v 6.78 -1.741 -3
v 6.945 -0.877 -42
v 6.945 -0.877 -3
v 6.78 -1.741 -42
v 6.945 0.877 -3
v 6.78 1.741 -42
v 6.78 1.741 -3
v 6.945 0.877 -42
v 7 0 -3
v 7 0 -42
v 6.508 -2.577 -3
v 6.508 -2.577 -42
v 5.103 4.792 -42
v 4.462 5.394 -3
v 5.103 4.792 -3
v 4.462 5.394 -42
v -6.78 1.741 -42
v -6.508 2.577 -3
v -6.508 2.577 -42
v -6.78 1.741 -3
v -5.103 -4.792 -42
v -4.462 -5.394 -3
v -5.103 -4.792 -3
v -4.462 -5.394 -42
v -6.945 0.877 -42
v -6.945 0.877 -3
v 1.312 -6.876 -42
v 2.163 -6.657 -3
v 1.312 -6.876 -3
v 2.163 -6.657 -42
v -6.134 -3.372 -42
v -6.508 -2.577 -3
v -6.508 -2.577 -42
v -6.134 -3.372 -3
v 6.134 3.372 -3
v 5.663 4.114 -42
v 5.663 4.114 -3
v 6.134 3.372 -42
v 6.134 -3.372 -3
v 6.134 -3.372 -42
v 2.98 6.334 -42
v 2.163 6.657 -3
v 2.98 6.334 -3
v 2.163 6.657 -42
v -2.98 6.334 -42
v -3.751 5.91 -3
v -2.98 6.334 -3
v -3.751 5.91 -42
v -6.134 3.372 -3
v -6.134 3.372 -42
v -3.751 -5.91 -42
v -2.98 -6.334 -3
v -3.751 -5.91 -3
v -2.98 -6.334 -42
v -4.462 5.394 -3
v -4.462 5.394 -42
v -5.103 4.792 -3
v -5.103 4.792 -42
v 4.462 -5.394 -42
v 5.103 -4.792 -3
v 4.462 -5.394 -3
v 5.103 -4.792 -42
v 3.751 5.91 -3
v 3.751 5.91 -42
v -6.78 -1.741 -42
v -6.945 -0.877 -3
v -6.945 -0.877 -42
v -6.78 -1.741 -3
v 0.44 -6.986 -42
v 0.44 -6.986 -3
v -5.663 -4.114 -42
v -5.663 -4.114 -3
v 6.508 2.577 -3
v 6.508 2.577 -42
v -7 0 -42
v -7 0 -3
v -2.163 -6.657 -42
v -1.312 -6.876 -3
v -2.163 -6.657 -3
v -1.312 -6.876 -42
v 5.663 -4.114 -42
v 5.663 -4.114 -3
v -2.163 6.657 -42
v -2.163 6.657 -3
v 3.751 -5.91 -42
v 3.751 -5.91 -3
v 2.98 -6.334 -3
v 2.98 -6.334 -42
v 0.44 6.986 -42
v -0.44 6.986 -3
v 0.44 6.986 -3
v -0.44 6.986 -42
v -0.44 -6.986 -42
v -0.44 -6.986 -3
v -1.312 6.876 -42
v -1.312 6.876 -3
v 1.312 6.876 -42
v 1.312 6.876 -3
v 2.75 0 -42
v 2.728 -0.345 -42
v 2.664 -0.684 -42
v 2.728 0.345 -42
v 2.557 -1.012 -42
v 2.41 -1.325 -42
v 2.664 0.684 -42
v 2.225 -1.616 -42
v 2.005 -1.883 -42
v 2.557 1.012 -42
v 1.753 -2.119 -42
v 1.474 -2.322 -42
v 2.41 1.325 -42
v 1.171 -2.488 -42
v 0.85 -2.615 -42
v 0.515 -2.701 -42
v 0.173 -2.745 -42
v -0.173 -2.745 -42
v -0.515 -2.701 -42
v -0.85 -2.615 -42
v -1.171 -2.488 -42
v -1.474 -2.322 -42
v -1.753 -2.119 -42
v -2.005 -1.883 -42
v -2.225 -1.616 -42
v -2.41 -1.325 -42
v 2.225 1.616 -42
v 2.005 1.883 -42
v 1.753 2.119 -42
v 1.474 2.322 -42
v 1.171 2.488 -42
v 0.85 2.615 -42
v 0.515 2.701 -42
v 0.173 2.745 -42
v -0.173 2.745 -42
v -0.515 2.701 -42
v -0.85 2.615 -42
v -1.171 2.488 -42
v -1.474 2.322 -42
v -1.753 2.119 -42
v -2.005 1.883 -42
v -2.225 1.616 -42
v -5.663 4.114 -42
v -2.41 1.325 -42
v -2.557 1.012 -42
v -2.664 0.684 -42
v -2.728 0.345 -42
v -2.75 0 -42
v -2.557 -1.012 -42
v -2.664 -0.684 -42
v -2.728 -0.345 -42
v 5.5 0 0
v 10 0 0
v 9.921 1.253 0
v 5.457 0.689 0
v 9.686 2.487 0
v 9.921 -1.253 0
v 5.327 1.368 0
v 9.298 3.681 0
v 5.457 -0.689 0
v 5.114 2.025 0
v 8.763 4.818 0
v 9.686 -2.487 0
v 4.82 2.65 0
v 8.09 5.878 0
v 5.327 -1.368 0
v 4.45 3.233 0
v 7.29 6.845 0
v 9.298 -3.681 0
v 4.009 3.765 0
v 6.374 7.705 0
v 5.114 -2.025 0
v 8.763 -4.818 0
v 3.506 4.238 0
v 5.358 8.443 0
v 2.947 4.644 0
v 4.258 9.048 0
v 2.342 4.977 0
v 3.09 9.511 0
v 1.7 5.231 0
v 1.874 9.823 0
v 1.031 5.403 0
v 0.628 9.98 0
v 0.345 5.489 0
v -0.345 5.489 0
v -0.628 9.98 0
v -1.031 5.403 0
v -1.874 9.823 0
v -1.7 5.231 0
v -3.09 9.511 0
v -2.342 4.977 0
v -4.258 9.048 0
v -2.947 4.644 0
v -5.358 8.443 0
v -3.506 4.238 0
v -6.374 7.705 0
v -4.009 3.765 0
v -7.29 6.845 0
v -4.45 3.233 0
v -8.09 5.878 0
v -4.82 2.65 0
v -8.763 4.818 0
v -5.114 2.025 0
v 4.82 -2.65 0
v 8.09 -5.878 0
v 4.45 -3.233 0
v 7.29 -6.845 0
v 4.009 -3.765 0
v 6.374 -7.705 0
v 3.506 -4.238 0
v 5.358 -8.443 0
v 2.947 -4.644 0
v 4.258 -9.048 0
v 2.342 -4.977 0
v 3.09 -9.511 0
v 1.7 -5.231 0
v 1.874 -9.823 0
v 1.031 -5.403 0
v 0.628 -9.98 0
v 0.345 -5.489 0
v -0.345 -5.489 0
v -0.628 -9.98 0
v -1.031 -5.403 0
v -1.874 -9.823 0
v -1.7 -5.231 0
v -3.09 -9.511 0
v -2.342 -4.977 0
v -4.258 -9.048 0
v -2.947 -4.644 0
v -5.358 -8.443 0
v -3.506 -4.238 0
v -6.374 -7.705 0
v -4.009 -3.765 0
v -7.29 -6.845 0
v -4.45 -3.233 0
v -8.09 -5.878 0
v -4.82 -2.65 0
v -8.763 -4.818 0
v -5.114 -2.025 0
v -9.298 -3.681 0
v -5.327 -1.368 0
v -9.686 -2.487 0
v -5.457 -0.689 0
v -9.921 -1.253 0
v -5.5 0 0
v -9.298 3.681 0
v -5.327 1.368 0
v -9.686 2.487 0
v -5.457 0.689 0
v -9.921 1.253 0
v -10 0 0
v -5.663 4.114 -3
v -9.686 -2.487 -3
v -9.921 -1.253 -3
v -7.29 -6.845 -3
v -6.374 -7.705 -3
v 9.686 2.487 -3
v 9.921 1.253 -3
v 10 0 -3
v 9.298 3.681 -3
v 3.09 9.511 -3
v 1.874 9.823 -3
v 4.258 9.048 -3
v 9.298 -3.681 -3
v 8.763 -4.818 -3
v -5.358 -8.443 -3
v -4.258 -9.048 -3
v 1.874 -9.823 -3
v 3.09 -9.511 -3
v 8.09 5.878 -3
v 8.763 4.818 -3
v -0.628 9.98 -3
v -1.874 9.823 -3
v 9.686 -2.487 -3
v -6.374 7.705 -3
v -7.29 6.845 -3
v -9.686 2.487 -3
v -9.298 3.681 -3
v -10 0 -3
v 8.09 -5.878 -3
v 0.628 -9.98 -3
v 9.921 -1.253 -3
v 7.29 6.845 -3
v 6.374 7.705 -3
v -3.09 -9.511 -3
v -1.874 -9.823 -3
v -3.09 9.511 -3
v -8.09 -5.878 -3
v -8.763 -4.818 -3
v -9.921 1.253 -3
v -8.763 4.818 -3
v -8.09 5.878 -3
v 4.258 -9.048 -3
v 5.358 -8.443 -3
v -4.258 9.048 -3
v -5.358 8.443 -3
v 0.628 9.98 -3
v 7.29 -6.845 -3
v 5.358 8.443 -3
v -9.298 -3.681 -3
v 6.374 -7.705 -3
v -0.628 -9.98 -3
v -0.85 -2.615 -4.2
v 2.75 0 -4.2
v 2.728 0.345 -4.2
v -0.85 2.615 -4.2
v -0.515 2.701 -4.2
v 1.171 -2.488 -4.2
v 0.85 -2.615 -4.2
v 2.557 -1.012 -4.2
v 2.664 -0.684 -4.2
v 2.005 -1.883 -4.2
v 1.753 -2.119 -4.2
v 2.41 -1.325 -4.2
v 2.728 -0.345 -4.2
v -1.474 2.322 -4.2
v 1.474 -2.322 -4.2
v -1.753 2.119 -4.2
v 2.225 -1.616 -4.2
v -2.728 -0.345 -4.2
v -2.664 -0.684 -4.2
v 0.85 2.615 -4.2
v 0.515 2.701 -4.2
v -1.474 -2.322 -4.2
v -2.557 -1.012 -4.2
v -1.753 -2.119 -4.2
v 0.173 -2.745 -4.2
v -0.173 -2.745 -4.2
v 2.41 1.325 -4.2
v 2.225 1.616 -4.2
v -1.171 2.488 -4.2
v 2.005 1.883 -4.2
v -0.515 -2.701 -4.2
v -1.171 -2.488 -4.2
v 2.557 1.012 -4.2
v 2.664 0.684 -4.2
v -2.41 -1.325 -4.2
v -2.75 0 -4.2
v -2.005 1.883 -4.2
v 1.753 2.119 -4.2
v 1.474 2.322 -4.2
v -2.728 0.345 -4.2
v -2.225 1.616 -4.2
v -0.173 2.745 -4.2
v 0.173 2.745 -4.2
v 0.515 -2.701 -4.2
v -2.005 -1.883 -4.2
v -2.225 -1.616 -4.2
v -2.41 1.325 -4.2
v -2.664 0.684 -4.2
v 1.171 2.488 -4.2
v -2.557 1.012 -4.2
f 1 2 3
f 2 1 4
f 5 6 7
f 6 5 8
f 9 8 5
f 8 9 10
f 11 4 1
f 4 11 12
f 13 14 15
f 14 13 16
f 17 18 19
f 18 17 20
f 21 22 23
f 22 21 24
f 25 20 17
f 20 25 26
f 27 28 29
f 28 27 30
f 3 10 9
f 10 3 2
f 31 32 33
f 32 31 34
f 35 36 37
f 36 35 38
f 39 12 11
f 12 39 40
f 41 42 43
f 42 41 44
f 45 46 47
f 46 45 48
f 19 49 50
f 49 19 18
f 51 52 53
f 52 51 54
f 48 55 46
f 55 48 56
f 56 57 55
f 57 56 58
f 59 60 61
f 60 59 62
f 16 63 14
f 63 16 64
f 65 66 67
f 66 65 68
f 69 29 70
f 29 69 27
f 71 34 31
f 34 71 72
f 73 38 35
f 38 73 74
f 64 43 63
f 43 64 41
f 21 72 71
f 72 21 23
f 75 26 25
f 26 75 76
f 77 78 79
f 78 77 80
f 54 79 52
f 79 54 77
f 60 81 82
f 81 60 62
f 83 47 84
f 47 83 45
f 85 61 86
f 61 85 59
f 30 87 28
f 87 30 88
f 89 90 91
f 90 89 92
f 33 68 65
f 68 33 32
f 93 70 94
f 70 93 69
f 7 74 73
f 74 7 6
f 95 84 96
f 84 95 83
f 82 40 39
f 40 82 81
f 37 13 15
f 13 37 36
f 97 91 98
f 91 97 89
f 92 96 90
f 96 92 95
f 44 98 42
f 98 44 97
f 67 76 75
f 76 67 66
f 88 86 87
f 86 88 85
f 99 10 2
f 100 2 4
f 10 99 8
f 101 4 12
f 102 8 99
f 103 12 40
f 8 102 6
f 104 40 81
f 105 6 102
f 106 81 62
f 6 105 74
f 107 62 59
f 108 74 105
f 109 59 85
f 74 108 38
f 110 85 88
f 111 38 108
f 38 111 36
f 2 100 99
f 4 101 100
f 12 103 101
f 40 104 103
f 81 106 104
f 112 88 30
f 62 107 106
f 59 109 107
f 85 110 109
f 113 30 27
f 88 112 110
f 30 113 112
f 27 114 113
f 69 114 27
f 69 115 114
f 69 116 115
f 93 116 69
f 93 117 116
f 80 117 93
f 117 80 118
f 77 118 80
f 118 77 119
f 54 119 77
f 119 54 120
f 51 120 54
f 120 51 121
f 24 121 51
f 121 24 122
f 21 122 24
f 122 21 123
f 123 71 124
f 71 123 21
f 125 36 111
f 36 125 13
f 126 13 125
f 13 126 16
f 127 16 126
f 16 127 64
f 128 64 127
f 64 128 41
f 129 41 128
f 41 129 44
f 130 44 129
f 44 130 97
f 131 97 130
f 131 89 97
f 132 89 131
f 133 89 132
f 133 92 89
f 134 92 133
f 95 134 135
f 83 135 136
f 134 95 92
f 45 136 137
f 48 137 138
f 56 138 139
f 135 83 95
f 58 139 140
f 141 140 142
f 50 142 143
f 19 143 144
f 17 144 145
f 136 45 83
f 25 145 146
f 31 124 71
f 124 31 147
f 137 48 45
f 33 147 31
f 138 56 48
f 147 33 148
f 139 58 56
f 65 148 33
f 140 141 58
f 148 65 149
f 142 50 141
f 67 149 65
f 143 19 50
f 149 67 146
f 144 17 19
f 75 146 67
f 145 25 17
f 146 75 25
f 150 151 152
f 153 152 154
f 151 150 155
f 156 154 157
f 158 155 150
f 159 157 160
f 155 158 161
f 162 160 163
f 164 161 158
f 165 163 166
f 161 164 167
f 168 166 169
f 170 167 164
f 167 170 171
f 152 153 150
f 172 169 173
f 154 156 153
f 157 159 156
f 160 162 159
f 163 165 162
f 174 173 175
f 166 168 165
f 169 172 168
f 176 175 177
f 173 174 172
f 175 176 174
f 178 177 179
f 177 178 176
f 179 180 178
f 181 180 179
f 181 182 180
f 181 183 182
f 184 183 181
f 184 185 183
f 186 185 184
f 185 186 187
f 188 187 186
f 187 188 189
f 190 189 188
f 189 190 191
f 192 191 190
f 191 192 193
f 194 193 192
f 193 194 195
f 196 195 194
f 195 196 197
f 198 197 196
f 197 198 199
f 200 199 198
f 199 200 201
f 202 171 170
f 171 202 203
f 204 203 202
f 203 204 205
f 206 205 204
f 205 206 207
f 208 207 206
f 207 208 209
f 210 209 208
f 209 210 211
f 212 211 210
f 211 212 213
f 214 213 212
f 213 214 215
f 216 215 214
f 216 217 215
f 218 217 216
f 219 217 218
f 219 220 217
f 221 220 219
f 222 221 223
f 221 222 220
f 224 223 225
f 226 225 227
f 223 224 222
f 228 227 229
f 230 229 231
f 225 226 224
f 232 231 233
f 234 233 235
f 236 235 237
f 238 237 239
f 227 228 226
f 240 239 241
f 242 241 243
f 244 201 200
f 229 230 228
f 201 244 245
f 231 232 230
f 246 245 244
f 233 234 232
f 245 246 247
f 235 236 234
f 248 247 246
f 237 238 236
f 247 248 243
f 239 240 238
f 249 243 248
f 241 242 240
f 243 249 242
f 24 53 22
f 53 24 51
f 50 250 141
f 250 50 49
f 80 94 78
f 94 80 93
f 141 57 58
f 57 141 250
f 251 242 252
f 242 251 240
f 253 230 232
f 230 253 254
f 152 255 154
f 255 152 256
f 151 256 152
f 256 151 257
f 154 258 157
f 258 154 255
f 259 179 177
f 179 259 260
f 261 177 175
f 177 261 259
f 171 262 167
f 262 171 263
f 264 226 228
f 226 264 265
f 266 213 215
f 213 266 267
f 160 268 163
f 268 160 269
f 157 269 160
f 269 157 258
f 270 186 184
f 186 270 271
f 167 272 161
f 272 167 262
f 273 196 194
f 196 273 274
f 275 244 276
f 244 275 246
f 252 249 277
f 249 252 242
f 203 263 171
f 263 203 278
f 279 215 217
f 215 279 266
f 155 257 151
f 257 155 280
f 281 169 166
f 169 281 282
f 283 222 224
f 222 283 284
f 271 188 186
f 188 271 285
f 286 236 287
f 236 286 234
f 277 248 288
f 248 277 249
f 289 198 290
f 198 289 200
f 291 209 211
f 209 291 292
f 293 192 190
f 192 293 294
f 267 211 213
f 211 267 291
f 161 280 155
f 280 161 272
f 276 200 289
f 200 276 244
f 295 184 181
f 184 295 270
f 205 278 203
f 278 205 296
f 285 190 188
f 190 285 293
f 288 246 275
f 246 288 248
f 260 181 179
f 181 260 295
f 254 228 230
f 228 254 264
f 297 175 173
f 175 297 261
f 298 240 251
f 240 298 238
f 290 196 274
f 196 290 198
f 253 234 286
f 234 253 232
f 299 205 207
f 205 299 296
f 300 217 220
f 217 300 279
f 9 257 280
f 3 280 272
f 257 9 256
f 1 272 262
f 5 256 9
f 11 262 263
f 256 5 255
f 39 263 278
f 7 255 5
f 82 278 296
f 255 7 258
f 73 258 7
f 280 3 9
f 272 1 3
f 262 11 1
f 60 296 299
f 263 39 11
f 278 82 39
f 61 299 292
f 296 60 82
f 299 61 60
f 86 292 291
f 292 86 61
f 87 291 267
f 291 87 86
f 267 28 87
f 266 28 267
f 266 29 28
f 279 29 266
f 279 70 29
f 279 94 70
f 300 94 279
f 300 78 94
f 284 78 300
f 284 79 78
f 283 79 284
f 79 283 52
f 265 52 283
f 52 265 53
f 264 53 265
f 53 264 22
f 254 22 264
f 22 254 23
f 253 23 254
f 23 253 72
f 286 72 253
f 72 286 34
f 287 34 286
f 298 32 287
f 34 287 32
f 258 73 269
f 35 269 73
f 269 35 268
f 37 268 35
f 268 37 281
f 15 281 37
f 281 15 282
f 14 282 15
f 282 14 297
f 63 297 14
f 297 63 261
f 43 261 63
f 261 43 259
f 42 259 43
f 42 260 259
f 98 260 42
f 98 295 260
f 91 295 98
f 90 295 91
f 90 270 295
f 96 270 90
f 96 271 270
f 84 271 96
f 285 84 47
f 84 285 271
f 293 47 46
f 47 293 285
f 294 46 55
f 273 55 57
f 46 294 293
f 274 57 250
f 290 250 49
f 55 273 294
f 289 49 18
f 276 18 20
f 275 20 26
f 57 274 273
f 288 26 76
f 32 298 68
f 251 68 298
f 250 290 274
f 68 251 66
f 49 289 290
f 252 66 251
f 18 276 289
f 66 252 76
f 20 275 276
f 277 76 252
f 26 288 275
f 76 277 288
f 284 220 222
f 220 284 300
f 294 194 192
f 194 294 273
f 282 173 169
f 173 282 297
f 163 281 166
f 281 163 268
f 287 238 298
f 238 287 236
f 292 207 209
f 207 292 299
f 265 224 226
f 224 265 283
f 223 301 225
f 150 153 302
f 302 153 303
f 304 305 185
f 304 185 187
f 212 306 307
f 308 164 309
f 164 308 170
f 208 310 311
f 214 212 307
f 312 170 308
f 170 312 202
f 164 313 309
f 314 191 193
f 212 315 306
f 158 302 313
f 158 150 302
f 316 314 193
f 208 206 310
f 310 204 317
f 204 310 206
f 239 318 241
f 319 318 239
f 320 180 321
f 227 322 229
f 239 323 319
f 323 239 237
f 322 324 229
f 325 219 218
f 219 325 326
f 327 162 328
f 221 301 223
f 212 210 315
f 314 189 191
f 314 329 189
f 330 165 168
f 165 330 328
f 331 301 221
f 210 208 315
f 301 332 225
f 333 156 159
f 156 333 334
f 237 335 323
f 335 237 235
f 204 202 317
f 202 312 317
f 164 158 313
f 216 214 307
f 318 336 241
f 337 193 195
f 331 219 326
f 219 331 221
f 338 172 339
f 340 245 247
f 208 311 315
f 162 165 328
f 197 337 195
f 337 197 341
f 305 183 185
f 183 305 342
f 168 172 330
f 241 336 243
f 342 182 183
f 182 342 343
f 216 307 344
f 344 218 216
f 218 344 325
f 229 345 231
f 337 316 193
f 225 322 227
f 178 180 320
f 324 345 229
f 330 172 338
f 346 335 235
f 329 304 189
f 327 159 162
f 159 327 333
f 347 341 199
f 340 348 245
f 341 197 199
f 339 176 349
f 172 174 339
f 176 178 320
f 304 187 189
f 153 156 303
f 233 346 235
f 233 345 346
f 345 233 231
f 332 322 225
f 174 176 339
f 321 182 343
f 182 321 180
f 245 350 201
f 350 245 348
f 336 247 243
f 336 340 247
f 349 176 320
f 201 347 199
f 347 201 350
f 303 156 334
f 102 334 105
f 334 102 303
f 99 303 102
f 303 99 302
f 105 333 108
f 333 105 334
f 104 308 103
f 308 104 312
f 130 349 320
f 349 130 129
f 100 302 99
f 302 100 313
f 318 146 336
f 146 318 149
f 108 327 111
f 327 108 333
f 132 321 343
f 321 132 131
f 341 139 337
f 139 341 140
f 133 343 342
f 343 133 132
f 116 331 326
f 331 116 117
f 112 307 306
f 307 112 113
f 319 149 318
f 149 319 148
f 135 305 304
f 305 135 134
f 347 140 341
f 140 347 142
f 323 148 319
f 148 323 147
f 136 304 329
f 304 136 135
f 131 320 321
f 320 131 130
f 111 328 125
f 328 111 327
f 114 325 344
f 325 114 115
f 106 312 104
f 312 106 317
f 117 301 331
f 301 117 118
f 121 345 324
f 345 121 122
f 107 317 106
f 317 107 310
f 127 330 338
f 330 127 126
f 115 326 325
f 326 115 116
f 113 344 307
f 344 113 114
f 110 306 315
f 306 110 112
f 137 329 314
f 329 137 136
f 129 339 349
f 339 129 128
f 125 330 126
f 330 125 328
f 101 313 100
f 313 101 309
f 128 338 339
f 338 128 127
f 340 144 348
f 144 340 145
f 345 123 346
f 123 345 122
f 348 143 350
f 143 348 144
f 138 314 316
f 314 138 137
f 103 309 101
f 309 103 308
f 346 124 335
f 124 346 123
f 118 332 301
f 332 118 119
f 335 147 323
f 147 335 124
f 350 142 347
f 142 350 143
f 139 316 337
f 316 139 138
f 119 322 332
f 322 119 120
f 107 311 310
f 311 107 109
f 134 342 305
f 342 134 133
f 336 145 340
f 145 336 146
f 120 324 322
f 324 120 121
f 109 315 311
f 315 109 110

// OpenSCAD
$fn = 50;


difference() {
	union() {
		translate(v = [0, 0, -42.0000000000]) {
			cylinder(h = 42, r = 7.0000000000);
		}
		translate(v = [0, 0, -3.0000000000]) {
			cylinder(h = 3, r = 10.0000000000);
		}
	}
	union() {
		translate(v = [0, 0, 0]) {
			rotate(a = [0, 0, 0]) {
				difference() {
					union() {
						#translate(v = [0, 0, -42.0000000000]) {
							cylinder(h = 42, r = 2.2500000000);
						}
						#translate(v = [0, 0, -4.2000000000]) {
							cylinder(h = 4.2000000000, r1 = 2.7500000000, r2 = 5.5000000000);
						}
						#translate(v = [0, 0, -42.0000000000]) {
							cylinder(h = 42, r = 2.7500000000);
						}
						#translate(v = [0, 0, -42.0000000000]) {
							cylinder(h = 42, r = 2.2500000000);
						}
					}
					union();
				}
			}
		}
	}
}
